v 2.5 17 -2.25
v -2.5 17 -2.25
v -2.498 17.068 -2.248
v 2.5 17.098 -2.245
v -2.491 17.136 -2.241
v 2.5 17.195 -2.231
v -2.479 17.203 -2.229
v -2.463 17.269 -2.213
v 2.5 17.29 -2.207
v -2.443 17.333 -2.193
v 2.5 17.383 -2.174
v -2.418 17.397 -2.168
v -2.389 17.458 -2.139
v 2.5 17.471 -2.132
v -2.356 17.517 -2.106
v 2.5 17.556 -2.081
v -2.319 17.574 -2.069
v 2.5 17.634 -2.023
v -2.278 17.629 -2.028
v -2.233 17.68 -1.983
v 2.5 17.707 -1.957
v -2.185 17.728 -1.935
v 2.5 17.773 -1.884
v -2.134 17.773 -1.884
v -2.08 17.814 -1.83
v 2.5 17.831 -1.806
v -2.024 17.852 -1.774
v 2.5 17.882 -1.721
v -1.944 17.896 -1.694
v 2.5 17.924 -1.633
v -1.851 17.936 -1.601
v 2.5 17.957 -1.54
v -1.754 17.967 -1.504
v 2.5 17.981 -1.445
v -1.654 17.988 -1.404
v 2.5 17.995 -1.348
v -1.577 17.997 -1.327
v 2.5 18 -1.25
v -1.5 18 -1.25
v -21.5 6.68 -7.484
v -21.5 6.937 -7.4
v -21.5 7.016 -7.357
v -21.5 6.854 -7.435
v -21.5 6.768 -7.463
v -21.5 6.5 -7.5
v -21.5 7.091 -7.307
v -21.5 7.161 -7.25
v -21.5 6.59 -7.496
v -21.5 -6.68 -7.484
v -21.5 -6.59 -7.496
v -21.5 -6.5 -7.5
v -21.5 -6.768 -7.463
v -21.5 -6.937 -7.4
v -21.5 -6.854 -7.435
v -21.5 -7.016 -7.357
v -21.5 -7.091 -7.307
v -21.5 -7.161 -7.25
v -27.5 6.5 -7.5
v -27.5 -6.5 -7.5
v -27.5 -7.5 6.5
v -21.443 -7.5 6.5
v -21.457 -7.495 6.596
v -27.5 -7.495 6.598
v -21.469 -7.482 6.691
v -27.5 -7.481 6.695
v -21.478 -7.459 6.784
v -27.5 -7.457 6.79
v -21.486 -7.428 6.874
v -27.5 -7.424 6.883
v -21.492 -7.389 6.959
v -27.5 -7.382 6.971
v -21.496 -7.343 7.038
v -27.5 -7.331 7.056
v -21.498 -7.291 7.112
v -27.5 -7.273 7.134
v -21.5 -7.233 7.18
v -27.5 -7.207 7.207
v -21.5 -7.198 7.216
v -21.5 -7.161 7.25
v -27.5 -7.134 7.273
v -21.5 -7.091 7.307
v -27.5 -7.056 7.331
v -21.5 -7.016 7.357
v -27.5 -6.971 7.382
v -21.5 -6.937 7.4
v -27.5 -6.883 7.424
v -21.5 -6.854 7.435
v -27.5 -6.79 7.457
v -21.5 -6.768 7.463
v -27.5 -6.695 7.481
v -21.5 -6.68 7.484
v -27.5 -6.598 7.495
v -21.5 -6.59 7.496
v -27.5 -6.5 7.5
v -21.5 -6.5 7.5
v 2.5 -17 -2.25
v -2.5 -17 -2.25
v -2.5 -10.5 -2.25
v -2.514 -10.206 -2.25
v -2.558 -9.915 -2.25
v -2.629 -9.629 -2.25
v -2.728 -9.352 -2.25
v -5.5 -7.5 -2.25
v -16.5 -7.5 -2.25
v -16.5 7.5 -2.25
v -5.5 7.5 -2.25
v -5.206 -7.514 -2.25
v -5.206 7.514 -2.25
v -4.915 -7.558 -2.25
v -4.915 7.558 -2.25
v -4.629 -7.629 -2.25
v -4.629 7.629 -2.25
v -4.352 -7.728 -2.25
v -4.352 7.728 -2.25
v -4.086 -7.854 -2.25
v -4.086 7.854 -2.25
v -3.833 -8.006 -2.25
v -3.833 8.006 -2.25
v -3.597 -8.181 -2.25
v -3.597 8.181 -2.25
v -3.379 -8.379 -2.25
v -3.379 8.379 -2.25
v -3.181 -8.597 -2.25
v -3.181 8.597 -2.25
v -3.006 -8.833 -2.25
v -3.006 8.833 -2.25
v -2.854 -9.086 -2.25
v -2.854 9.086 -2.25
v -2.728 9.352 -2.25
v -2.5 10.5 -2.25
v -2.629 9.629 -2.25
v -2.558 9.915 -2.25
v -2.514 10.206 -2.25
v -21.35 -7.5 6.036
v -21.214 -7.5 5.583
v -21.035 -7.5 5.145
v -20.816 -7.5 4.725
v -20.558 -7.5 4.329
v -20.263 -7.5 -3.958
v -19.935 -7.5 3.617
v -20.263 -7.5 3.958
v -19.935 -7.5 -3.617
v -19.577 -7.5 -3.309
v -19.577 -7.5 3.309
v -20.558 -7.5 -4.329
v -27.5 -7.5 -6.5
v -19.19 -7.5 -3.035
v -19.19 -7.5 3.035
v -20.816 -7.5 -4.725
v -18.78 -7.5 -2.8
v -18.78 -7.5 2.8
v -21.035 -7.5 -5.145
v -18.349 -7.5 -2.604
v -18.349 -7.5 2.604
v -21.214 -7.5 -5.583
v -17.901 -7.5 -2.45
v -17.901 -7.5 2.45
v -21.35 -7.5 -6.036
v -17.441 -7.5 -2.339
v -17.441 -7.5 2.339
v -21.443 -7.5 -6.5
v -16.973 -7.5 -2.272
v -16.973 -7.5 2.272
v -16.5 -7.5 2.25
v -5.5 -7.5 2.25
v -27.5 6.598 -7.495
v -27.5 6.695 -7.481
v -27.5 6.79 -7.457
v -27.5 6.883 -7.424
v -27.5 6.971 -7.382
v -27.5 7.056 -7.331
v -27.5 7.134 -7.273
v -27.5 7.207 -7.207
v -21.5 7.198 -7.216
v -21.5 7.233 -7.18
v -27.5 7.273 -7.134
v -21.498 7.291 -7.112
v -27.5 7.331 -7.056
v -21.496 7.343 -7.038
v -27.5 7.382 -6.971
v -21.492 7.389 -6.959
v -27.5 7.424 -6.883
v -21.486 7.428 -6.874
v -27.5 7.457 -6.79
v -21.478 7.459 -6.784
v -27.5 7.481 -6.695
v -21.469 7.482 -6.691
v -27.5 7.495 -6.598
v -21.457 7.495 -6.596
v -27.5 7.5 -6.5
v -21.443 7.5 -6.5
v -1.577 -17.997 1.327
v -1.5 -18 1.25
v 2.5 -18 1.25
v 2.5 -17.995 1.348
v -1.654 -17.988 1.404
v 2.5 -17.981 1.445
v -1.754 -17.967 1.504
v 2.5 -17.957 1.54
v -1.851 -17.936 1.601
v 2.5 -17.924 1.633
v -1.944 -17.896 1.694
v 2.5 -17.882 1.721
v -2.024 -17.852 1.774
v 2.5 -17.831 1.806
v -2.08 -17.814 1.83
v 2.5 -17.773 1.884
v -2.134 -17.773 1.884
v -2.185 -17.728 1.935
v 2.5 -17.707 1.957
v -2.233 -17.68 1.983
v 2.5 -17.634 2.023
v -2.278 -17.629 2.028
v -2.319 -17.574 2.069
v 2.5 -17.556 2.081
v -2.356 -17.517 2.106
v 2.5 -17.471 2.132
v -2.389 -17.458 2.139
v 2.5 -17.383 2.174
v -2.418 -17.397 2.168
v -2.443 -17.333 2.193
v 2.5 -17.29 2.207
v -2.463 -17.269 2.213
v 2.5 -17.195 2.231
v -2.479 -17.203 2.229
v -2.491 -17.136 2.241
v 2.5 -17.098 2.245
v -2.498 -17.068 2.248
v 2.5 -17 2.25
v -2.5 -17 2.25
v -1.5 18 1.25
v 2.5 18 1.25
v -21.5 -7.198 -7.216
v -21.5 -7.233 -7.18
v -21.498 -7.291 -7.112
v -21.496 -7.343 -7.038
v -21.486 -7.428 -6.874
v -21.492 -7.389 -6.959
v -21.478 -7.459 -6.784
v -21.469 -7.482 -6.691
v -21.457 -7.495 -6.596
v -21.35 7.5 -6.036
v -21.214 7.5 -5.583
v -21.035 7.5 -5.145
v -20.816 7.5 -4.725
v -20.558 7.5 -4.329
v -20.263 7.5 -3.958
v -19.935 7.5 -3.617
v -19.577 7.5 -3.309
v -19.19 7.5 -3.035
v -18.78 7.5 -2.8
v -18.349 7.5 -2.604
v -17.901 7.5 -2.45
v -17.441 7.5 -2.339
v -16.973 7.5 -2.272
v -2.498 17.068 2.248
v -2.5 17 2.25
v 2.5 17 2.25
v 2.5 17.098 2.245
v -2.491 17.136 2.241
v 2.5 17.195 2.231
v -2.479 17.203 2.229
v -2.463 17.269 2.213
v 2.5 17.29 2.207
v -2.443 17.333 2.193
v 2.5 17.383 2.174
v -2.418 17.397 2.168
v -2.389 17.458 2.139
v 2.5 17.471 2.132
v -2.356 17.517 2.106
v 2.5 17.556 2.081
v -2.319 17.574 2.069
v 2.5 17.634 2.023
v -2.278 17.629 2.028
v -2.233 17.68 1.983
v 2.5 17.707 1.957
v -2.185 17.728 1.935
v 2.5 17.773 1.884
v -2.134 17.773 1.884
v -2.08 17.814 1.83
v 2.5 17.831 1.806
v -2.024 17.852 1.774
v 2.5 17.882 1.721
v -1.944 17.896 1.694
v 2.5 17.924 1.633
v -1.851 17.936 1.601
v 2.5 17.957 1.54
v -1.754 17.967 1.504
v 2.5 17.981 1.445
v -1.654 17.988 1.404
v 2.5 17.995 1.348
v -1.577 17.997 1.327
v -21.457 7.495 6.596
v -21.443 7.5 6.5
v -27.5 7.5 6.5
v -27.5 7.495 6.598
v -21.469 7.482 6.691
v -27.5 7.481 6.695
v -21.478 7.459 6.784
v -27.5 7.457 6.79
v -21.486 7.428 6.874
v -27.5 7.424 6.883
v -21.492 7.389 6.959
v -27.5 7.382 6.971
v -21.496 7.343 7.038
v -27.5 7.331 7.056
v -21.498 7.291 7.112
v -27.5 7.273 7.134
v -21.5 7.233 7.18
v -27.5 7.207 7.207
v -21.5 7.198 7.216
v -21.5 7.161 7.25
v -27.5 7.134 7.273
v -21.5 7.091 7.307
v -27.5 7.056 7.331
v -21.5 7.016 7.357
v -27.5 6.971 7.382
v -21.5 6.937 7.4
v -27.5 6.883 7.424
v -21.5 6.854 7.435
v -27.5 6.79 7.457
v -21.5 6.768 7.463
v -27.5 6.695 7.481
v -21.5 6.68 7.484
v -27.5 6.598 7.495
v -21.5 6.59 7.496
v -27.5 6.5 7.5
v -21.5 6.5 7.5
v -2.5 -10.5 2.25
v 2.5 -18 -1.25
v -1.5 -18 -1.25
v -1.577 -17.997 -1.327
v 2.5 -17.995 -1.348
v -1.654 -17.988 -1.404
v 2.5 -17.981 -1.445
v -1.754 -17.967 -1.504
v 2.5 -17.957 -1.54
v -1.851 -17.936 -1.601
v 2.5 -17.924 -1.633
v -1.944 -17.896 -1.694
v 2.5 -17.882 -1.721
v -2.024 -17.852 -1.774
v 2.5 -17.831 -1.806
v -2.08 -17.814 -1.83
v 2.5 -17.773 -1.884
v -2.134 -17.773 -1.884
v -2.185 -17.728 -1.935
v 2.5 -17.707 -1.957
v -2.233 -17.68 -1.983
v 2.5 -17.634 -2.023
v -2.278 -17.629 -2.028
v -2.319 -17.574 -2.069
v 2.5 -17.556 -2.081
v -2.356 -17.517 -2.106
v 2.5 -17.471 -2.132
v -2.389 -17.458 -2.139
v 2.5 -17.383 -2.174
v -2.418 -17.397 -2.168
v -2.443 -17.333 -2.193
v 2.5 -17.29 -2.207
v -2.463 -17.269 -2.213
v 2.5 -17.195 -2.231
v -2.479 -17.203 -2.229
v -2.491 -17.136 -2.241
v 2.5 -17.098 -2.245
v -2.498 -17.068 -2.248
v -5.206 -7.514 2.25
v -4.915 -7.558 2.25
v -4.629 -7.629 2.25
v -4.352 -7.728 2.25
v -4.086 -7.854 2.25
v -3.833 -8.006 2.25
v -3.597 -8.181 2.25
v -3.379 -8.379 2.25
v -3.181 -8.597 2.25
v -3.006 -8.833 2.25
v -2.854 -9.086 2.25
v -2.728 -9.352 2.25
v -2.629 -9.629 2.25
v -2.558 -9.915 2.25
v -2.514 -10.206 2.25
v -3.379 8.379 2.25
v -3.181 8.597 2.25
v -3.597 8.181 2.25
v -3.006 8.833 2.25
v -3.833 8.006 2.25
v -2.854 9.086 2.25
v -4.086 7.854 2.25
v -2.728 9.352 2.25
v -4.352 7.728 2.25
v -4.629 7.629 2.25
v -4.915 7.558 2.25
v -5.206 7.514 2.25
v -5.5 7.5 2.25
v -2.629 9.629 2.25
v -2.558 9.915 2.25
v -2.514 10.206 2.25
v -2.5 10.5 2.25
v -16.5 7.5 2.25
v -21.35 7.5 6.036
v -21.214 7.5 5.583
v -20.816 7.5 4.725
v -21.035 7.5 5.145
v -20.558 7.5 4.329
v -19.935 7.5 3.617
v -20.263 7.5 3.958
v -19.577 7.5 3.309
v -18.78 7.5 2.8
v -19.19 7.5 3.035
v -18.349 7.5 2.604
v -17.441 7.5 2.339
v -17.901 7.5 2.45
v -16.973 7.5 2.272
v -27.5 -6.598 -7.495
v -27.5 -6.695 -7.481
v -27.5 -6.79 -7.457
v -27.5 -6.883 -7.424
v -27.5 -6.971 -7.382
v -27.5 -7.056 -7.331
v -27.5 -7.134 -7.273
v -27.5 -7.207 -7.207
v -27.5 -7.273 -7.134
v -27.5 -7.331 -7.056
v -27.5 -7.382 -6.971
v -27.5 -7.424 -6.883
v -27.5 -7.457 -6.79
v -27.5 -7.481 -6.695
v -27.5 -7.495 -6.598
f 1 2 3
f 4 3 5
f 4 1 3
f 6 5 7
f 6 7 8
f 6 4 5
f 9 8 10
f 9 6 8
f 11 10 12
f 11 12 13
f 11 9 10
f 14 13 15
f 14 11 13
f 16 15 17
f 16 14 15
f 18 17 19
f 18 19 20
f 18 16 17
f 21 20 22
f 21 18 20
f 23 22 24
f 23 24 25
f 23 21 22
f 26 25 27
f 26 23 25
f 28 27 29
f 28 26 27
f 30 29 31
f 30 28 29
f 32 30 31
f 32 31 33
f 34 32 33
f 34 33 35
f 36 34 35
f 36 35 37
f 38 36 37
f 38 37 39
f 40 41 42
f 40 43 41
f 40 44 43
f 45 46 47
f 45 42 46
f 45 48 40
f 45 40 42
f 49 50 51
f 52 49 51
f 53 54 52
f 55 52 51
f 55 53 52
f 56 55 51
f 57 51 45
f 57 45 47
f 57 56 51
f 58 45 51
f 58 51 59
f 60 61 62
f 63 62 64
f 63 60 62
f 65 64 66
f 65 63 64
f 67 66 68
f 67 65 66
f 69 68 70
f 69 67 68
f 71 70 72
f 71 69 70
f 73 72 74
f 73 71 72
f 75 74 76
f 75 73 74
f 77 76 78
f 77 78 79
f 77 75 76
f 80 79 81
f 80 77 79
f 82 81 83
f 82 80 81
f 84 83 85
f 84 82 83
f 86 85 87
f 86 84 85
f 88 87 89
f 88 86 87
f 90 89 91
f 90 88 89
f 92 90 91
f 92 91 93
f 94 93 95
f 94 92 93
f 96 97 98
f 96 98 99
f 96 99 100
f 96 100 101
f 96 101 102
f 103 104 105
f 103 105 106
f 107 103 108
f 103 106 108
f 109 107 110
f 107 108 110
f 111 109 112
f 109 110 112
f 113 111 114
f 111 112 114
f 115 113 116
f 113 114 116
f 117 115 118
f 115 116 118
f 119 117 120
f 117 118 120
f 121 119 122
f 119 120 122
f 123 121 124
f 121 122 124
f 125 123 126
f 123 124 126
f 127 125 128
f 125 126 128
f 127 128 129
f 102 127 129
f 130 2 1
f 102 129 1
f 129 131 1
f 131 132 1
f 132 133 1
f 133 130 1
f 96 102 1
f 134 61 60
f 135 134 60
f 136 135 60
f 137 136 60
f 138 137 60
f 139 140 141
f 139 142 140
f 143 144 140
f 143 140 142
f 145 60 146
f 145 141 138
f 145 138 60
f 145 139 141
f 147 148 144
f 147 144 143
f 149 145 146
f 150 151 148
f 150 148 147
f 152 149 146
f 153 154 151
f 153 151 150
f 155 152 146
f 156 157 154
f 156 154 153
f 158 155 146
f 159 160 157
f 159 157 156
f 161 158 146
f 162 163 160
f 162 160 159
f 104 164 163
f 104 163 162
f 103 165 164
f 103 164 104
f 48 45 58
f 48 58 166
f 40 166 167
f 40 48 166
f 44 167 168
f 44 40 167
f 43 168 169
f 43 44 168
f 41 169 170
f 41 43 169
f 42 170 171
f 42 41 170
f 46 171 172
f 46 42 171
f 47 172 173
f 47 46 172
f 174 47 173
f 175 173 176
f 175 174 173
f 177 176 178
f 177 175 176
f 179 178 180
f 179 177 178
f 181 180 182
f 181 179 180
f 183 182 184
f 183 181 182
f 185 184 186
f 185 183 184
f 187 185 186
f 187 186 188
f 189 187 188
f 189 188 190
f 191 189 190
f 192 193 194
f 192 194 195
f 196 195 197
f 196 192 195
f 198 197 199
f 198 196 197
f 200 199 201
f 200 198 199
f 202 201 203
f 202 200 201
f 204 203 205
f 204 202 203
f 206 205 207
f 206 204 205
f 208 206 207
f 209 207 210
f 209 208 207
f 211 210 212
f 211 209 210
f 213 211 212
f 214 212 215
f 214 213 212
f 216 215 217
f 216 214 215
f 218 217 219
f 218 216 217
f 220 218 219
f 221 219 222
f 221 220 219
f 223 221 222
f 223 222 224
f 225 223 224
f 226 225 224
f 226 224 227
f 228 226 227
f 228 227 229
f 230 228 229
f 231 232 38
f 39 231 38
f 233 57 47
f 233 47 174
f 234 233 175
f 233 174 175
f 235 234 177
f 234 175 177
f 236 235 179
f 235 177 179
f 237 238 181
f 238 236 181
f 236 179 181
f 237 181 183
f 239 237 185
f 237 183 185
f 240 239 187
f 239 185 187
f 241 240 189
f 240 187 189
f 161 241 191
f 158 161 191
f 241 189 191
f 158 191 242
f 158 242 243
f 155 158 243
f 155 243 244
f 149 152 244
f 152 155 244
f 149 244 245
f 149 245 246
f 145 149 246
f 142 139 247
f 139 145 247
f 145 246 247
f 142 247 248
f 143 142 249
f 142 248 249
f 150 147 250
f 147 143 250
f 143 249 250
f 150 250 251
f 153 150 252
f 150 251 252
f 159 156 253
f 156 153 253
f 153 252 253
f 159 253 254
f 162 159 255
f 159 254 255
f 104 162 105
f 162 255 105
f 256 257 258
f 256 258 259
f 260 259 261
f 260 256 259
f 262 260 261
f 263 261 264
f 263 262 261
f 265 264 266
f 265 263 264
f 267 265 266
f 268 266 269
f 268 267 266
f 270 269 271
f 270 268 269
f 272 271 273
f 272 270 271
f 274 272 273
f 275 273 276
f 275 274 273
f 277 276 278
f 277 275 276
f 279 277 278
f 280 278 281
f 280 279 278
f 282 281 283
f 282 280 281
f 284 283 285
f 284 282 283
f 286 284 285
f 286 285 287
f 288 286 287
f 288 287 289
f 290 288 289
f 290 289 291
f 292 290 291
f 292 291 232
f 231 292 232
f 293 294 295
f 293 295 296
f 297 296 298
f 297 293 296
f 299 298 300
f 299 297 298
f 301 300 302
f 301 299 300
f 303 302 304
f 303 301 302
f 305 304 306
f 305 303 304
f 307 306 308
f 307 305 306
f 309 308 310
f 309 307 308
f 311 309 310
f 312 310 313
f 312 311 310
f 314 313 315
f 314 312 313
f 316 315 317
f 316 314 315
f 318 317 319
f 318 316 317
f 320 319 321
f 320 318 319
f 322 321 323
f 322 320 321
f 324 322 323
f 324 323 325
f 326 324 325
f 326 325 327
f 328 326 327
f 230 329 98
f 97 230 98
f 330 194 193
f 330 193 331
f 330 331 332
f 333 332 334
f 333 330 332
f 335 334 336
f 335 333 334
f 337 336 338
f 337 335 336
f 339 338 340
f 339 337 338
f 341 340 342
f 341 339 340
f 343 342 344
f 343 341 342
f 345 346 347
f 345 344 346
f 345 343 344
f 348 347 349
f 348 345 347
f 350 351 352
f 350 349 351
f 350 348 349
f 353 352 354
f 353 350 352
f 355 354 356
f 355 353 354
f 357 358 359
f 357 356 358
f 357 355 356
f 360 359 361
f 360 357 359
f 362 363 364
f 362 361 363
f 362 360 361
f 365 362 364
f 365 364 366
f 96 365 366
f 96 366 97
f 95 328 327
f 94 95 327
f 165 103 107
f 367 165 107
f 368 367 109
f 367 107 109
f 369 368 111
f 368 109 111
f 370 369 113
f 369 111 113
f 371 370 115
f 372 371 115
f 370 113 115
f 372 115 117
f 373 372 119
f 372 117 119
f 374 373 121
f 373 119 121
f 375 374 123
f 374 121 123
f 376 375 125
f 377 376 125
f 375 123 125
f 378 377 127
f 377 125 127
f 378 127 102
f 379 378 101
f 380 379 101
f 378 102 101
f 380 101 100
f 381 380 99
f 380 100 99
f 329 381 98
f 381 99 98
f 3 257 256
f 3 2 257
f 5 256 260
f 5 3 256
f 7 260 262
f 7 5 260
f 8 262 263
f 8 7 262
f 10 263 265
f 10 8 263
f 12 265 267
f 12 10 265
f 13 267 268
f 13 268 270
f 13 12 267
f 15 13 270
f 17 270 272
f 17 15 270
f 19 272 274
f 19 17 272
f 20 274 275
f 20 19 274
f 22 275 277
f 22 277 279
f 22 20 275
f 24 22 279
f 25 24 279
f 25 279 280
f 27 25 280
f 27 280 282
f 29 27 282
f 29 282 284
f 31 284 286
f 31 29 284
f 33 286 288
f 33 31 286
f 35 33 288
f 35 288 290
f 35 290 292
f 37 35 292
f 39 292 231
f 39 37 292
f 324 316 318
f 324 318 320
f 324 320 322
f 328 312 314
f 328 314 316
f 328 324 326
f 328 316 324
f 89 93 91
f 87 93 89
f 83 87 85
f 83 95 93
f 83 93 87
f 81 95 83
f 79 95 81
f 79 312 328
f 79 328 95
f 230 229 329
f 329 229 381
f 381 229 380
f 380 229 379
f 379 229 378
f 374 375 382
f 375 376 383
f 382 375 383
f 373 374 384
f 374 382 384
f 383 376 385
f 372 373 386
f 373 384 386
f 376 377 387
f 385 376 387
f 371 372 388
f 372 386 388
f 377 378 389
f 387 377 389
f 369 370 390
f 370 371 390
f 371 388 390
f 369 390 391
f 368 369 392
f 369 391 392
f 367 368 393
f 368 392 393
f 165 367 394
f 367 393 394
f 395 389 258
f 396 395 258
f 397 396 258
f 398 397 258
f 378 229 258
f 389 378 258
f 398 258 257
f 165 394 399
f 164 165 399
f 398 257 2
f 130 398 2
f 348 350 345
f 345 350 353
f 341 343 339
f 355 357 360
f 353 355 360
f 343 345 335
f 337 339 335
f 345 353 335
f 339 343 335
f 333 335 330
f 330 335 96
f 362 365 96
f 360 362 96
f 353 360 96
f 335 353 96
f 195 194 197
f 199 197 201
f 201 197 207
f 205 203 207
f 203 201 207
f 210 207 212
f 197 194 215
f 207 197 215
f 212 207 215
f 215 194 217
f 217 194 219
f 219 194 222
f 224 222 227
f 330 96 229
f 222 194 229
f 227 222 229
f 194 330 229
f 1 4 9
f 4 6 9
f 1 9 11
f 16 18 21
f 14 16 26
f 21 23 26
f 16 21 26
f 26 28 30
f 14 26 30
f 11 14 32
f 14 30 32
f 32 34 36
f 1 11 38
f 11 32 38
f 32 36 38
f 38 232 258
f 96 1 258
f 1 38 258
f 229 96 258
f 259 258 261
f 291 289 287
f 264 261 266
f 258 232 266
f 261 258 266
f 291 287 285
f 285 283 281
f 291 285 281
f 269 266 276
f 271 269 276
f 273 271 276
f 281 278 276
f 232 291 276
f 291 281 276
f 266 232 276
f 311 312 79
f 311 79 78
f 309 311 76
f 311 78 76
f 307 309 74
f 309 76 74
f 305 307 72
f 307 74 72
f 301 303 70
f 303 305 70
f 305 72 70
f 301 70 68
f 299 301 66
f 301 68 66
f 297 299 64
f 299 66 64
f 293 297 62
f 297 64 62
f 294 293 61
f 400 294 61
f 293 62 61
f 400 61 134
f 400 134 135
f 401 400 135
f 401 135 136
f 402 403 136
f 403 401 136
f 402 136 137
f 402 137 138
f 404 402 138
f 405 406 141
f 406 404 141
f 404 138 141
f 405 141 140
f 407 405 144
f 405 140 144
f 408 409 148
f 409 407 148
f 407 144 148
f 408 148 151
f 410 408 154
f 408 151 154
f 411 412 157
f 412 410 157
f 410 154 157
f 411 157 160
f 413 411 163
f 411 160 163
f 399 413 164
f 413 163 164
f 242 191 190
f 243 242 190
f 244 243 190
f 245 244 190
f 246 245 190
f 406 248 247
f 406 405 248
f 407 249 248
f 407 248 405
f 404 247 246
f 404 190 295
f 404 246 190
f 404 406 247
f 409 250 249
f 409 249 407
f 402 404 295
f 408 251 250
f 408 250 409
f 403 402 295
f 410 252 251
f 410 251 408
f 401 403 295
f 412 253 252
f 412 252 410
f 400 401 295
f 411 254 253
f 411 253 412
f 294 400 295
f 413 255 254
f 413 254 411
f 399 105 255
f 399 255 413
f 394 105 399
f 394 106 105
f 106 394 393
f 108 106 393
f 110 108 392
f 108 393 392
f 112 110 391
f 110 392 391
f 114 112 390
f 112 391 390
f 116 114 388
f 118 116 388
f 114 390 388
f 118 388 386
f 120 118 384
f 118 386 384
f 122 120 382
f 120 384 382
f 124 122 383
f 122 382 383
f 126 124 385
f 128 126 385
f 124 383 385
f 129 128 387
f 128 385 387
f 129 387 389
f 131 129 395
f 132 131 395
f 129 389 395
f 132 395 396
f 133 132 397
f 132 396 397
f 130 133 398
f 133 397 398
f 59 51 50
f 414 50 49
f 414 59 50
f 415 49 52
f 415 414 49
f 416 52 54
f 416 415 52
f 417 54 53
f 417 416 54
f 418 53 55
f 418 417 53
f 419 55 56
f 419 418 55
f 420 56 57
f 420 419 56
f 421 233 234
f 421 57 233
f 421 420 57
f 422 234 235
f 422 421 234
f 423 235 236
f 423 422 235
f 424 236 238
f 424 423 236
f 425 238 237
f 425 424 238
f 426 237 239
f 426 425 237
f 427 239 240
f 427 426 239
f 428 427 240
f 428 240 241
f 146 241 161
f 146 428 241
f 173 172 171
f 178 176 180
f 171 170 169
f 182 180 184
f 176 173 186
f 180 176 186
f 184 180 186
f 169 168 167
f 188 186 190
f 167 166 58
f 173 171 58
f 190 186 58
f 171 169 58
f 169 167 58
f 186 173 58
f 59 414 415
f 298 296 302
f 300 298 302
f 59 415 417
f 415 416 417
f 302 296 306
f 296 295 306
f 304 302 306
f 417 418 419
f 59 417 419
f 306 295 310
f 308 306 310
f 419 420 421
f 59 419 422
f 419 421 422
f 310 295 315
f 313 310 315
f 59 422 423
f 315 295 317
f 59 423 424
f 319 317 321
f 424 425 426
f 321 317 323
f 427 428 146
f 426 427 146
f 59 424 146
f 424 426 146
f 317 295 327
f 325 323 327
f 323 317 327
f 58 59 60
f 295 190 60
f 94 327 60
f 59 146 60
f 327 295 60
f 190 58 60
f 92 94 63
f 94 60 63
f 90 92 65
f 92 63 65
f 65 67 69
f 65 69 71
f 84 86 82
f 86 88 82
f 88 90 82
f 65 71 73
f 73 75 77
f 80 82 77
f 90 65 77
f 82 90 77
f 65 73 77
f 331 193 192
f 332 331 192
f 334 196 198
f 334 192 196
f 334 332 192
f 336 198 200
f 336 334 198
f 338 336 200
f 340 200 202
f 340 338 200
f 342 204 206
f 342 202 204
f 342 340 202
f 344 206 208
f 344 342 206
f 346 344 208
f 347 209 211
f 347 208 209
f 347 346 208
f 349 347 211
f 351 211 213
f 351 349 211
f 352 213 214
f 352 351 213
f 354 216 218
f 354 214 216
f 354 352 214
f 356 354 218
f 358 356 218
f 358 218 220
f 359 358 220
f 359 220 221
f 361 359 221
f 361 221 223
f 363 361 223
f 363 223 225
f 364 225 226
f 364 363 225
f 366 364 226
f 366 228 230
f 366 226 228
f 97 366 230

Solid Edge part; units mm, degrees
sketch "Sketch1" plane through (0, 0, 0) normal (0, -1, 0) x (1, 0, 0)
  line L0 (-2.5, -2.25) -> (2.5, -2.25)
  line L1 (2.5, -2.25) -> (2.5, 2.25)
  line L2 (2.5, 2.25) -> (-2.5, 2.25)
  line L3 (-2.5, 2.25) -> (-2.5, -2.25)
  dimension "D1" = 5
  dimension "D2" = 4.5
extrude "Protrusion1" add sketch "Sketch1" along normal mid plane 36
fillet "Round_2" radius 1 3 edges at (0, 18, 2.25) (-2.5, 18, 0) (0, 18, -2.25)
mirror "Mirror1" about plane through (0, 0, 0) normal (0, -1, 0) of "Round_2"
sketch "Sketch2" plane through (-2.5, 0, 0) normal (-1, 0, 0) x (0, -1, 0)
  line L0 (7.5, -2.25) -> (-7.5, -2.25)
  line L1 (-7.5, -2.25) -> (-7.5, 2.25)
  line L2 (-7.5, 2.25) -> (7.5, 2.25)
  line L3 (7.5, 2.25) -> (7.5, -2.25)
  dimension "D1" = 15
extrude "ExtrudedProtrusion_2" add sketch "Sketch2" along normal blind 25
sketch "Sketch3" plane through (0, 0, 0) normal (0, 0, 1) x (1, 0, 0)
  line L0 (-21.5, -7.5) -> (-27.5, -7.5)
  line L1 (-27.5, -7.5) -> (-27.5, 7.5)
  line L2 (-27.5, 7.5) -> (-21.5, 7.5)
  line L3 (-21.5, 7.5) -> (-21.5, -7.5)
  dimension "D1" = 6
extrude "ExtrudedProtrusion_3" add sketch "Sketch3" along normal mid plane 15
fillet "Round_3" radius 5 2 edges at (-21.5, 0, 2.25) (-21.5, 0, -2.25)
fillet "Round_4" radius 1 4 edges at (-24.5, -7.5, 7.5) (-24.5, 7.5, 7.5) (-24.5, -7.5, -7.5) (-24.5, 7.5, -7.5)
fillet "Round_5" radius 3 2 edges at (-2.5, -7.5, 0) (-2.5, 7.5, 0)
